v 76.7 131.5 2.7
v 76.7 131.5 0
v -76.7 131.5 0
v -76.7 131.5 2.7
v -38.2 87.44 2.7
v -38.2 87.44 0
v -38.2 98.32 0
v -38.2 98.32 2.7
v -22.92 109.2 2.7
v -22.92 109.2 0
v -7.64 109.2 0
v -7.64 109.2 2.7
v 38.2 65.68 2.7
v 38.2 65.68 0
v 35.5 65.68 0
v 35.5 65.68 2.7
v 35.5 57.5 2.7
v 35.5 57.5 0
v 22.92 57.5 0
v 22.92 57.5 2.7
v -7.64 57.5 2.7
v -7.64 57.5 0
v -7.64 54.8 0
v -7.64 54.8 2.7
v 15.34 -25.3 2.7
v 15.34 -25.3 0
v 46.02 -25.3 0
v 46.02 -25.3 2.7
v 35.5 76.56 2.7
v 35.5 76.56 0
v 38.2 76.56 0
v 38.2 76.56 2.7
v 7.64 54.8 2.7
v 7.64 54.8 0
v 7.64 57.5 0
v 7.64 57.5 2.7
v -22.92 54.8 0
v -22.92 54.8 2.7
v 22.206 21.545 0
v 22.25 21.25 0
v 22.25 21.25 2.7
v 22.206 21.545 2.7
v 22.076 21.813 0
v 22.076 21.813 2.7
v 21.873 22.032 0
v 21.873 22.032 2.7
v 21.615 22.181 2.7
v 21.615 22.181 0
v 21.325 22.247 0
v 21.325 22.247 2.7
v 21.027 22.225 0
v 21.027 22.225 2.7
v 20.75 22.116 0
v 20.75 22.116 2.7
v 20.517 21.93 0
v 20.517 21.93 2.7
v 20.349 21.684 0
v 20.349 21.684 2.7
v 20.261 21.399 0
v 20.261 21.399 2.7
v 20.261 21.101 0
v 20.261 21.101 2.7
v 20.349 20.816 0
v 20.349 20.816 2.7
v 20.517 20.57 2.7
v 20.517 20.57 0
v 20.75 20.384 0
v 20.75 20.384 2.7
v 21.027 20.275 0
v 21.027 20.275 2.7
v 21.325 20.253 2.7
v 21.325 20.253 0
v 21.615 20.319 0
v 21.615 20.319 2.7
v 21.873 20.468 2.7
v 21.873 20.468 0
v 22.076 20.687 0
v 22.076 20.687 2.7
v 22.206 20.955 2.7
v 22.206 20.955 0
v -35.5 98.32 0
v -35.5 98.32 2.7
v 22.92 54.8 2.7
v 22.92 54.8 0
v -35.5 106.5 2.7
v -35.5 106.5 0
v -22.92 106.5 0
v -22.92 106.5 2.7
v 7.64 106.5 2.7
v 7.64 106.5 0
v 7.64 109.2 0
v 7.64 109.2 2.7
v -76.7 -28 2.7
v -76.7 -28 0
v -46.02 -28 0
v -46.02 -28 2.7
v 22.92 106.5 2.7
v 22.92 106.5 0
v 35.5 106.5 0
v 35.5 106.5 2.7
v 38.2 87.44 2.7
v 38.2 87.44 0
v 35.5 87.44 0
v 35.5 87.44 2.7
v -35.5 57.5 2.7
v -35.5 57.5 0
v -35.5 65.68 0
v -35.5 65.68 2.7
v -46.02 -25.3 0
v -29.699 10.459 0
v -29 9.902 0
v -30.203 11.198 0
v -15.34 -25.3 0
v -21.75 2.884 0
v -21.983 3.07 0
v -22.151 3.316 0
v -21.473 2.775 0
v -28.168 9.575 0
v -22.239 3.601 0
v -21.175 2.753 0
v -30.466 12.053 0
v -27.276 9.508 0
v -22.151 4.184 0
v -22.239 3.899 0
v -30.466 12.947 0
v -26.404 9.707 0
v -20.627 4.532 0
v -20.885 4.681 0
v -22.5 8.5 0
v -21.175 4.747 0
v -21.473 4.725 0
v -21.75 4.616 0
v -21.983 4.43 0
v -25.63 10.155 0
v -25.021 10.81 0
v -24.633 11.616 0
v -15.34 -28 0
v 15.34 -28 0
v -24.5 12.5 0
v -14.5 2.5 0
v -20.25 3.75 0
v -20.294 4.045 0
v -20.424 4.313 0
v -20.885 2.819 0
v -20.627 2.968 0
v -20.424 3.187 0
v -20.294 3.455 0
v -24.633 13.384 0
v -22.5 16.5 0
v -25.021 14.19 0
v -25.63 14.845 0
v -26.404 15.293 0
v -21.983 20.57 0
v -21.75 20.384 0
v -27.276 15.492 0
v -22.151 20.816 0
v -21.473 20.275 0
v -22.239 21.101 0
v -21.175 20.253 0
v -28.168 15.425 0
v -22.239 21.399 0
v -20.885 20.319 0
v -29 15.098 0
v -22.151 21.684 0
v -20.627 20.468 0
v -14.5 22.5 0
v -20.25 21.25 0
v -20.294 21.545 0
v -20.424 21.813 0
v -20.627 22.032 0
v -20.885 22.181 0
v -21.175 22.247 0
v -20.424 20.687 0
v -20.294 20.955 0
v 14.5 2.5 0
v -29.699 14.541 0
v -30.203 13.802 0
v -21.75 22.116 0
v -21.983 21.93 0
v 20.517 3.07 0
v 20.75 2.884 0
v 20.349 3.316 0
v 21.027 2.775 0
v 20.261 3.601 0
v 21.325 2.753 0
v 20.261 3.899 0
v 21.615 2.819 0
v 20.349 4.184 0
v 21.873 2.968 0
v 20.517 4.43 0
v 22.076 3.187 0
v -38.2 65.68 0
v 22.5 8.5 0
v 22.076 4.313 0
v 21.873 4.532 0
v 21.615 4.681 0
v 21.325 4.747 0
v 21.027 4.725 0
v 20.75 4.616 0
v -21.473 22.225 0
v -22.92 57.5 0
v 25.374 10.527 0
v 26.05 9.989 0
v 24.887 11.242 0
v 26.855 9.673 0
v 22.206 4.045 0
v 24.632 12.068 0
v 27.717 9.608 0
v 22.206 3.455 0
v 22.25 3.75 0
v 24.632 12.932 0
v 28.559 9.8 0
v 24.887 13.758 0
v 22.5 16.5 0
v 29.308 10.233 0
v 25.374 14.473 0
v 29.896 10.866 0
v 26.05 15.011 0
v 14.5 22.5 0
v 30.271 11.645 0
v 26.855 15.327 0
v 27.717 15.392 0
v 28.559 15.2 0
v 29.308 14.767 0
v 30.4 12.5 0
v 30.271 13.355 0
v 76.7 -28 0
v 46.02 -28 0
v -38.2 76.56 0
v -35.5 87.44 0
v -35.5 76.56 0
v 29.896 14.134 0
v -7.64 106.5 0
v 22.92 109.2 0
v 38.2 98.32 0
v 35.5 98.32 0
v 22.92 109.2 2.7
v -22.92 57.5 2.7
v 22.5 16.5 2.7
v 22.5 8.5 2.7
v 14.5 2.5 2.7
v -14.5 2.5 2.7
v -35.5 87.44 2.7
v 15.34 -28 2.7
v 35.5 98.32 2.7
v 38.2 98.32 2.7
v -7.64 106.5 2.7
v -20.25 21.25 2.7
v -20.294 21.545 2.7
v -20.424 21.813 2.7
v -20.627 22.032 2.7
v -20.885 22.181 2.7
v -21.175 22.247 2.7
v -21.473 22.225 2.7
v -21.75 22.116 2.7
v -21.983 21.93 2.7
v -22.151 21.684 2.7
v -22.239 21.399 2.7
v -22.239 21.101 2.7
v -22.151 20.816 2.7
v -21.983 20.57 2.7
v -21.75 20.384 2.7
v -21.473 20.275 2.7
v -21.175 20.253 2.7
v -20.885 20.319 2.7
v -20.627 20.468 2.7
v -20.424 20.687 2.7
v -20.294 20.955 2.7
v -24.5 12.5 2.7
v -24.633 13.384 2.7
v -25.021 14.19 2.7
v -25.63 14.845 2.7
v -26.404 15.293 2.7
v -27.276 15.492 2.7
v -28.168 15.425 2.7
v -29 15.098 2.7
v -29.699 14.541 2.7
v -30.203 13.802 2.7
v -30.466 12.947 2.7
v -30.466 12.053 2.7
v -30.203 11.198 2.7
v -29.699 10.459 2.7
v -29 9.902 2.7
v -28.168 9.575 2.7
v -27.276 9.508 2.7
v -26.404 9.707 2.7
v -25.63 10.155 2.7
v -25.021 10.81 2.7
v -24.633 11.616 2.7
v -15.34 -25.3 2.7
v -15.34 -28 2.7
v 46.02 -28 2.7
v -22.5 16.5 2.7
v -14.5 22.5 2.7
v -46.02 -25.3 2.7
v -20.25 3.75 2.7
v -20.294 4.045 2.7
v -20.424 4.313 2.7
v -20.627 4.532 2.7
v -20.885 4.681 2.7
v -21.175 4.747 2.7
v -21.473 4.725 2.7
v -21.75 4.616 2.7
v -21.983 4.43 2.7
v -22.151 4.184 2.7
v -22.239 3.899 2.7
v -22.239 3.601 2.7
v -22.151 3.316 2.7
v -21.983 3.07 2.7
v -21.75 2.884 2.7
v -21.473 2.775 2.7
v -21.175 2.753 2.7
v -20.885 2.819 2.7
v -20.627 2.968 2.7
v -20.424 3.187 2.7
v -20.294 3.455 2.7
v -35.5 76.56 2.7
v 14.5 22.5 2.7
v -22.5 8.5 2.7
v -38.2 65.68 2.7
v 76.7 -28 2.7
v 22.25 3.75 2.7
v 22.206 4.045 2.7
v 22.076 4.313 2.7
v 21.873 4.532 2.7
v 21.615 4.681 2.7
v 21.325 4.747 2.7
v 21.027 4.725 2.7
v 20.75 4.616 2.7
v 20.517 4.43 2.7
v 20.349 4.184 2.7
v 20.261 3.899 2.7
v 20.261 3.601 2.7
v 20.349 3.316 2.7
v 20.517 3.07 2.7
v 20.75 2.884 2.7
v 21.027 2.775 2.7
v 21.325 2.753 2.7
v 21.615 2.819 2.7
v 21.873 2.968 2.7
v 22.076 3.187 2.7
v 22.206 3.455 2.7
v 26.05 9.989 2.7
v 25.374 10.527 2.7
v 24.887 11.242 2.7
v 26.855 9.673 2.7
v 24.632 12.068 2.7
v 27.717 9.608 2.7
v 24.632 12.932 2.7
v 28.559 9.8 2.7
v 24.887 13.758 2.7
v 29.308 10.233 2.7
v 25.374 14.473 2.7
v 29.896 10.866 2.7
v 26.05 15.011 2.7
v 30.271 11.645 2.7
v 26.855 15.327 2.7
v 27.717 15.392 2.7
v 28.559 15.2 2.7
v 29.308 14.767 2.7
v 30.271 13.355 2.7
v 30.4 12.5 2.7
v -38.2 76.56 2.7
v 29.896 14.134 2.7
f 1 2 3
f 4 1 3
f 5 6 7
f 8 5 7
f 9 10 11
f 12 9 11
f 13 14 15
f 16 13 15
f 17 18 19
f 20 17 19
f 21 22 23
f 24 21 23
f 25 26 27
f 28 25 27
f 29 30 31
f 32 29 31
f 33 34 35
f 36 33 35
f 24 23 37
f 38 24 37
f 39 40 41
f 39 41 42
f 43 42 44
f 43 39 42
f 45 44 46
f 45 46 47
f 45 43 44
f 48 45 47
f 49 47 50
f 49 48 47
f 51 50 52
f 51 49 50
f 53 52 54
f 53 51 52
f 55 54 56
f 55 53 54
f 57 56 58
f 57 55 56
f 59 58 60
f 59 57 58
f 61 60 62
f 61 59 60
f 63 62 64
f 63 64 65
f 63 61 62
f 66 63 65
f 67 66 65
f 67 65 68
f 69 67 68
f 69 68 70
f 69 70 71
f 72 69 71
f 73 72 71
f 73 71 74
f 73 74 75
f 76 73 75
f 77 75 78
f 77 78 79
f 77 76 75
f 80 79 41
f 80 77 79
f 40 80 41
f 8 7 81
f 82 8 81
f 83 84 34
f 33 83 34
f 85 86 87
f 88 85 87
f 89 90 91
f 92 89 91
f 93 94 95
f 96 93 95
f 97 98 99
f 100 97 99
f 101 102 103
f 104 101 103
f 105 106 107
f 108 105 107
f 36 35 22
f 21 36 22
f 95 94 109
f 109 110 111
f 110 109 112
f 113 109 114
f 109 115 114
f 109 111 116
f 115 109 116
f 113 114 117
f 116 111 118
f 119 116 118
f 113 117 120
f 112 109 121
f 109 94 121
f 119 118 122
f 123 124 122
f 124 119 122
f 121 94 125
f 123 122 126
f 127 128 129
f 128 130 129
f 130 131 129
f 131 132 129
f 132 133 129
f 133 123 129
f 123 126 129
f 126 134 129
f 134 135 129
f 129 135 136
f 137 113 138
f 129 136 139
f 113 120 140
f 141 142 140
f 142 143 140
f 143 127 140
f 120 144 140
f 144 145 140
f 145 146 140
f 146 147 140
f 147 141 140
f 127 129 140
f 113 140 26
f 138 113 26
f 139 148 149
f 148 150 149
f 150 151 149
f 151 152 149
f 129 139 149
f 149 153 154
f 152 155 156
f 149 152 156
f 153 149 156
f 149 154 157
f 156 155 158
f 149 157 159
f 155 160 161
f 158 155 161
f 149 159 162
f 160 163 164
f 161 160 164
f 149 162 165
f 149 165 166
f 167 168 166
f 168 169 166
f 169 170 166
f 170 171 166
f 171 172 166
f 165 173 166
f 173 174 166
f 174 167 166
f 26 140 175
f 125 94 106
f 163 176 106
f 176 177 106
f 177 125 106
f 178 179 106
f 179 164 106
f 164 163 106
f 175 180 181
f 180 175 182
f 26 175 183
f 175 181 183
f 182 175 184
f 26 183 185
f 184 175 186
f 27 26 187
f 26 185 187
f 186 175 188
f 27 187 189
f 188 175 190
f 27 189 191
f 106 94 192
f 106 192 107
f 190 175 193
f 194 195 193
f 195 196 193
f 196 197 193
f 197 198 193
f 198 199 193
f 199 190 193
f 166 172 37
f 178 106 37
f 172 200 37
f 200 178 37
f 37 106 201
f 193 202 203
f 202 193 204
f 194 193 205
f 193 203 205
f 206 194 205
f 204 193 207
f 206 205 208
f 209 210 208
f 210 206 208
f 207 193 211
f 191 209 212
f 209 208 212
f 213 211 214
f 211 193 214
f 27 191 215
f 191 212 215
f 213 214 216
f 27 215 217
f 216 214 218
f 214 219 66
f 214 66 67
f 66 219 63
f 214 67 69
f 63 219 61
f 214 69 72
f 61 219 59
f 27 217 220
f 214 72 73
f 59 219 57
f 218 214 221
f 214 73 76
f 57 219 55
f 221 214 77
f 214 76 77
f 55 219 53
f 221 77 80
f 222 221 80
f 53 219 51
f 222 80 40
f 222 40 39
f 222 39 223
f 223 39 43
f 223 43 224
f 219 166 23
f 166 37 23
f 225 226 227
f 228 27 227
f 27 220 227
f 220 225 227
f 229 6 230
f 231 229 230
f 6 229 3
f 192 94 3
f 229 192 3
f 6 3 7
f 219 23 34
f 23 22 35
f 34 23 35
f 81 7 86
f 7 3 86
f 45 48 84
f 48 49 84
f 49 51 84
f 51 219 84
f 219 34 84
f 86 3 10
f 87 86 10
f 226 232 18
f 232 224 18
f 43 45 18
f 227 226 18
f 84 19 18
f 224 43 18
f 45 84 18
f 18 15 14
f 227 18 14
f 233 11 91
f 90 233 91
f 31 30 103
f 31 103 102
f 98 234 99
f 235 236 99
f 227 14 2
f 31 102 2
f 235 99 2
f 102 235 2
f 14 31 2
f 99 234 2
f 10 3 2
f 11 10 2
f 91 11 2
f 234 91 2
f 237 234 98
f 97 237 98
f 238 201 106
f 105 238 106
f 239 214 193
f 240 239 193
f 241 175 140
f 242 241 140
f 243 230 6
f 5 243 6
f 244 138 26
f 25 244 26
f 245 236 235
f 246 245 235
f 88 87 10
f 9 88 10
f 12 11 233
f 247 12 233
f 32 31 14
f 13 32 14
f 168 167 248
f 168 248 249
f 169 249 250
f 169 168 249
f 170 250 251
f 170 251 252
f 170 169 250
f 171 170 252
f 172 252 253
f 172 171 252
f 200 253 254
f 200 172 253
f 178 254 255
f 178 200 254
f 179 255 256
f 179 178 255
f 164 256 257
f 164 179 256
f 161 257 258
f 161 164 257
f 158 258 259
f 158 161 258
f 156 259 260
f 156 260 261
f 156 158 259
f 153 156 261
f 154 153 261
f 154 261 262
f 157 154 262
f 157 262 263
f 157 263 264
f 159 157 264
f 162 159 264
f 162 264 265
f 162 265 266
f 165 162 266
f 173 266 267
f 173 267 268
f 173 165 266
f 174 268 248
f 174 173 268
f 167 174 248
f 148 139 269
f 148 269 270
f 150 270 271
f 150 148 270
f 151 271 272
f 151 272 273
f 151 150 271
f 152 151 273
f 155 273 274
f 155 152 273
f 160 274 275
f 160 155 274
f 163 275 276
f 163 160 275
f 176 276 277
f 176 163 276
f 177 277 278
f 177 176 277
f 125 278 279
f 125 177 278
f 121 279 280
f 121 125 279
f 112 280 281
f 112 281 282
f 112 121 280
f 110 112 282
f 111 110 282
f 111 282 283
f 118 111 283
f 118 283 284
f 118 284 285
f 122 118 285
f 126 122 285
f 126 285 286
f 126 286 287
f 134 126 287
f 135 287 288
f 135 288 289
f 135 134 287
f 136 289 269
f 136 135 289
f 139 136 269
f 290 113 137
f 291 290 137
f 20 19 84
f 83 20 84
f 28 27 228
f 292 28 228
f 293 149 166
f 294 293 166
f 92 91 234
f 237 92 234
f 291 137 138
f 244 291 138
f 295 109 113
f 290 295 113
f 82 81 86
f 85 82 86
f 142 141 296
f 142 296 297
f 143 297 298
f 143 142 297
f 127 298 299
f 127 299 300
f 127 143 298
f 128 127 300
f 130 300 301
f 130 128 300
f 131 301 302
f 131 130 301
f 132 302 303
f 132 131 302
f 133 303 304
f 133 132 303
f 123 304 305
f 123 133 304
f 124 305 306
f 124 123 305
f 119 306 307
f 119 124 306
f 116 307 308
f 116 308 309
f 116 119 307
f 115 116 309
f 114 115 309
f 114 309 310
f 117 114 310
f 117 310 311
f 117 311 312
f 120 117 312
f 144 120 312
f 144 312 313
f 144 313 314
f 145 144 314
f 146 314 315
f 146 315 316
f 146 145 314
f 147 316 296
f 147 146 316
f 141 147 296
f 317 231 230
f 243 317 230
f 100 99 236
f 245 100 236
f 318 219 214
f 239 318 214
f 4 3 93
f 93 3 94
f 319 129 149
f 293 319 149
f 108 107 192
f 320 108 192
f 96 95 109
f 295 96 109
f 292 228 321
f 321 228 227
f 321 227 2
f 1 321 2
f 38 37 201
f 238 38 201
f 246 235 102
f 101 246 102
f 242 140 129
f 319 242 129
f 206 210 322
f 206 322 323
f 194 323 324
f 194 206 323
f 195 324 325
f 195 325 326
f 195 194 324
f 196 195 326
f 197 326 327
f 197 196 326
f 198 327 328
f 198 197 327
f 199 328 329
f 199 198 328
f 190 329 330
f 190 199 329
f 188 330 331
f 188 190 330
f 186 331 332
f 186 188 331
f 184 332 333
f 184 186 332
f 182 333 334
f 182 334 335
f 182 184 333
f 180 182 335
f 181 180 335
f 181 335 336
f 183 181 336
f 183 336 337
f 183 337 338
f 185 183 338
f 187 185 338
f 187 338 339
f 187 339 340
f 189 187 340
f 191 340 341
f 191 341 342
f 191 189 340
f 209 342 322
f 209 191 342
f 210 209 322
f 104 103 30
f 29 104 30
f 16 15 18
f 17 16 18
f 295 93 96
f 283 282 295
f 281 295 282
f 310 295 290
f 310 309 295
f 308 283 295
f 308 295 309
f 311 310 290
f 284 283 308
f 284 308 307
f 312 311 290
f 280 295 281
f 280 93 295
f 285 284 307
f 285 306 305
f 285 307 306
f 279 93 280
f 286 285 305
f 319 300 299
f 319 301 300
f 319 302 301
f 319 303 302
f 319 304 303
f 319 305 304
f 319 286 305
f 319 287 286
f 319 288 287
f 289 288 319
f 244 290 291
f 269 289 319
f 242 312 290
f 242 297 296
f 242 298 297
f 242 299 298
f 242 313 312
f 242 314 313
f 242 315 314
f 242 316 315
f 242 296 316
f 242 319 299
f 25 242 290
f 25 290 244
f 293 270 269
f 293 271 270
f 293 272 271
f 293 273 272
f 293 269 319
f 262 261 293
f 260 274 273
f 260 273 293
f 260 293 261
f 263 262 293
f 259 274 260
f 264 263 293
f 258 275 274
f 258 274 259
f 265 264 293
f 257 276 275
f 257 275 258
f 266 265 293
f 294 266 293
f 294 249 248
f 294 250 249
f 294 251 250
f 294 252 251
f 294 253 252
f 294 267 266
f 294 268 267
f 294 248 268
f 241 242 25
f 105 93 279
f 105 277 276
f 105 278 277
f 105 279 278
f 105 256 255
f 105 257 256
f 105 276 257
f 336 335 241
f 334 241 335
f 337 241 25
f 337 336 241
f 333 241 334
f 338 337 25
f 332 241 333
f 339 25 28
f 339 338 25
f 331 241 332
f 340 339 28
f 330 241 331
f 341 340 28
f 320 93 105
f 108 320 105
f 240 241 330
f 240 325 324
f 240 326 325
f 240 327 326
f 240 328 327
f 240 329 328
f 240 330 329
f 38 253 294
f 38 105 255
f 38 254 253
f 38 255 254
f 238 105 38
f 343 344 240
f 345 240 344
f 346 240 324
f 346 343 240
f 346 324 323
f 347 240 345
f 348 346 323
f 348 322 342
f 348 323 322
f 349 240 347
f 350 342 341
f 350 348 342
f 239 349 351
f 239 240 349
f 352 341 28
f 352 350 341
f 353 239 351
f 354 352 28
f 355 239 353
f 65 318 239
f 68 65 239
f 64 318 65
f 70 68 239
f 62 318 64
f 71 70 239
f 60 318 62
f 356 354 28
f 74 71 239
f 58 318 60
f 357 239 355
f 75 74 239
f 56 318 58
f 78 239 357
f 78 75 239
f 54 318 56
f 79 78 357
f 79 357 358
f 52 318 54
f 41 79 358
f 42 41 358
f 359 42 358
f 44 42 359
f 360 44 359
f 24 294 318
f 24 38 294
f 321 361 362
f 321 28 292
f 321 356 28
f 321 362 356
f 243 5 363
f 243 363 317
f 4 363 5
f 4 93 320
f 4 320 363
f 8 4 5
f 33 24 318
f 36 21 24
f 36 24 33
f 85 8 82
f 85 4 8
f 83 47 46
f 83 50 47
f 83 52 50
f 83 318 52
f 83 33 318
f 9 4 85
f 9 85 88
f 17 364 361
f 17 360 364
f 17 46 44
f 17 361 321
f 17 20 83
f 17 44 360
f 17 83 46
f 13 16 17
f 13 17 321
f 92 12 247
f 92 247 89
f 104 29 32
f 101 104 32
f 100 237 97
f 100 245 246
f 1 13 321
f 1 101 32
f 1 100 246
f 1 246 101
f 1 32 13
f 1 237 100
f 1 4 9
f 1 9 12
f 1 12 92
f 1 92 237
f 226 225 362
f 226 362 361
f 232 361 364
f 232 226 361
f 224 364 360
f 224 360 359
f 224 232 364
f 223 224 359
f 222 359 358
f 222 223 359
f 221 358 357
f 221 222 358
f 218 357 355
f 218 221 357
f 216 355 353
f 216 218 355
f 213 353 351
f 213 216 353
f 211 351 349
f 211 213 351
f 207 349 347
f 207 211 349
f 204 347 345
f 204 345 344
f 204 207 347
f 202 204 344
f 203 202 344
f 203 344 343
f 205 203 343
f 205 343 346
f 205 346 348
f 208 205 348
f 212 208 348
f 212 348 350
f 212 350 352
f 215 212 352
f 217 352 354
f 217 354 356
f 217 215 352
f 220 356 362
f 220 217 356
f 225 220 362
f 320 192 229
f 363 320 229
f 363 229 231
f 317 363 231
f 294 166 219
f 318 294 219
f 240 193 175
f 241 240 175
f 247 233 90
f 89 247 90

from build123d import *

# Parameters (mm, degrees)
SKETCH1_R           = 1
SKETCH1_R_2         = 3
SKETCH1_R_3         = 2.9
BOSS_EXTRUDE3_DEPTH = 2.7


with BuildPart() as part:
    # Sketch1 → Boss-Extrude3 (new body)
    with BuildSketch(Plane.XY):
        Polygon((-46.02, -28), (-46.02, -25.3), (-15.34, -25.3), (-15.34, -28), (15.34, -28), (15.34, -25.3), (46.02, -25.3), (46.02, -28), (76.7, -28), (76.7, -25.3), (76.7, -23), (76.7, 13), (76.7, 131.5), (-76.7, 131.5), (-76.7, 13), (-76.7, -23), (-76.7, -25.3), (-76.7, -28), align=None)
        with Locations((-21.25, 3.75)):
            Circle(SKETCH1_R, mode=Mode.SUBTRACT)
        with Locations((-27.5, 12.5)):
            Circle(SKETCH1_R_2, mode=Mode.SUBTRACT)
        with Locations((-21.25, 21.25)):
            Circle(SKETCH1_R, mode=Mode.SUBTRACT)
        with Locations((21.25, 3.75)):
            Circle(SKETCH1_R, mode=Mode.SUBTRACT)
        with Locations((27.5, 12.5)):
            Circle(SKETCH1_R_3, mode=Mode.SUBTRACT)
        with Locations((21.25, 21.25)):
            Circle(SKETCH1_R, mode=Mode.SUBTRACT)
        Polygon((-22.5, 16.5), (-14.5, 22.5), (14.5, 22.5), (22.5, 16.5), (22.5, 8.5), (14.5, 2.5), (0, 2.5), (-14.5, 2.5), (-22.5, 8.5), align=None, mode=Mode.SUBTRACT)
        Polygon((35.5, 57.5), (22.92, 57.5), (22.92, 54.8), (7.64, 54.8), (7.64, 57.5), (-7.64, 57.5), (-7.64, 54.8), (-22.92, 54.8), (-22.92, 57.5), (-35.5, 57.5), (-35.5, 65.68), (-38.2, 65.68), (-38.2, 76.56), (-35.5, 76.56), (-35.5, 87.44), (-38.2, 87.44), (-38.2, 98.32), (-35.5, 98.32), (-35.5, 106.5), (-22.92, 106.5), (-22.92, 109.2), (-7.64, 109.2), (-7.64, 106.5), (7.64, 106.5), (7.64, 109.2), (22.92, 109.2), (22.92, 106.5), (35.5, 106.5), (35.5, 98.32), (38.2, 98.32), (38.2, 87.44), (35.5, 87.44), (35.5, 76.56), (38.2, 76.56), (38.2, 65.68), (35.5, 65.68), align=None, mode=Mode.SUBTRACT)
    extrude(amount=BOSS_EXTRUDE3_DEPTH)


solid = part.part
